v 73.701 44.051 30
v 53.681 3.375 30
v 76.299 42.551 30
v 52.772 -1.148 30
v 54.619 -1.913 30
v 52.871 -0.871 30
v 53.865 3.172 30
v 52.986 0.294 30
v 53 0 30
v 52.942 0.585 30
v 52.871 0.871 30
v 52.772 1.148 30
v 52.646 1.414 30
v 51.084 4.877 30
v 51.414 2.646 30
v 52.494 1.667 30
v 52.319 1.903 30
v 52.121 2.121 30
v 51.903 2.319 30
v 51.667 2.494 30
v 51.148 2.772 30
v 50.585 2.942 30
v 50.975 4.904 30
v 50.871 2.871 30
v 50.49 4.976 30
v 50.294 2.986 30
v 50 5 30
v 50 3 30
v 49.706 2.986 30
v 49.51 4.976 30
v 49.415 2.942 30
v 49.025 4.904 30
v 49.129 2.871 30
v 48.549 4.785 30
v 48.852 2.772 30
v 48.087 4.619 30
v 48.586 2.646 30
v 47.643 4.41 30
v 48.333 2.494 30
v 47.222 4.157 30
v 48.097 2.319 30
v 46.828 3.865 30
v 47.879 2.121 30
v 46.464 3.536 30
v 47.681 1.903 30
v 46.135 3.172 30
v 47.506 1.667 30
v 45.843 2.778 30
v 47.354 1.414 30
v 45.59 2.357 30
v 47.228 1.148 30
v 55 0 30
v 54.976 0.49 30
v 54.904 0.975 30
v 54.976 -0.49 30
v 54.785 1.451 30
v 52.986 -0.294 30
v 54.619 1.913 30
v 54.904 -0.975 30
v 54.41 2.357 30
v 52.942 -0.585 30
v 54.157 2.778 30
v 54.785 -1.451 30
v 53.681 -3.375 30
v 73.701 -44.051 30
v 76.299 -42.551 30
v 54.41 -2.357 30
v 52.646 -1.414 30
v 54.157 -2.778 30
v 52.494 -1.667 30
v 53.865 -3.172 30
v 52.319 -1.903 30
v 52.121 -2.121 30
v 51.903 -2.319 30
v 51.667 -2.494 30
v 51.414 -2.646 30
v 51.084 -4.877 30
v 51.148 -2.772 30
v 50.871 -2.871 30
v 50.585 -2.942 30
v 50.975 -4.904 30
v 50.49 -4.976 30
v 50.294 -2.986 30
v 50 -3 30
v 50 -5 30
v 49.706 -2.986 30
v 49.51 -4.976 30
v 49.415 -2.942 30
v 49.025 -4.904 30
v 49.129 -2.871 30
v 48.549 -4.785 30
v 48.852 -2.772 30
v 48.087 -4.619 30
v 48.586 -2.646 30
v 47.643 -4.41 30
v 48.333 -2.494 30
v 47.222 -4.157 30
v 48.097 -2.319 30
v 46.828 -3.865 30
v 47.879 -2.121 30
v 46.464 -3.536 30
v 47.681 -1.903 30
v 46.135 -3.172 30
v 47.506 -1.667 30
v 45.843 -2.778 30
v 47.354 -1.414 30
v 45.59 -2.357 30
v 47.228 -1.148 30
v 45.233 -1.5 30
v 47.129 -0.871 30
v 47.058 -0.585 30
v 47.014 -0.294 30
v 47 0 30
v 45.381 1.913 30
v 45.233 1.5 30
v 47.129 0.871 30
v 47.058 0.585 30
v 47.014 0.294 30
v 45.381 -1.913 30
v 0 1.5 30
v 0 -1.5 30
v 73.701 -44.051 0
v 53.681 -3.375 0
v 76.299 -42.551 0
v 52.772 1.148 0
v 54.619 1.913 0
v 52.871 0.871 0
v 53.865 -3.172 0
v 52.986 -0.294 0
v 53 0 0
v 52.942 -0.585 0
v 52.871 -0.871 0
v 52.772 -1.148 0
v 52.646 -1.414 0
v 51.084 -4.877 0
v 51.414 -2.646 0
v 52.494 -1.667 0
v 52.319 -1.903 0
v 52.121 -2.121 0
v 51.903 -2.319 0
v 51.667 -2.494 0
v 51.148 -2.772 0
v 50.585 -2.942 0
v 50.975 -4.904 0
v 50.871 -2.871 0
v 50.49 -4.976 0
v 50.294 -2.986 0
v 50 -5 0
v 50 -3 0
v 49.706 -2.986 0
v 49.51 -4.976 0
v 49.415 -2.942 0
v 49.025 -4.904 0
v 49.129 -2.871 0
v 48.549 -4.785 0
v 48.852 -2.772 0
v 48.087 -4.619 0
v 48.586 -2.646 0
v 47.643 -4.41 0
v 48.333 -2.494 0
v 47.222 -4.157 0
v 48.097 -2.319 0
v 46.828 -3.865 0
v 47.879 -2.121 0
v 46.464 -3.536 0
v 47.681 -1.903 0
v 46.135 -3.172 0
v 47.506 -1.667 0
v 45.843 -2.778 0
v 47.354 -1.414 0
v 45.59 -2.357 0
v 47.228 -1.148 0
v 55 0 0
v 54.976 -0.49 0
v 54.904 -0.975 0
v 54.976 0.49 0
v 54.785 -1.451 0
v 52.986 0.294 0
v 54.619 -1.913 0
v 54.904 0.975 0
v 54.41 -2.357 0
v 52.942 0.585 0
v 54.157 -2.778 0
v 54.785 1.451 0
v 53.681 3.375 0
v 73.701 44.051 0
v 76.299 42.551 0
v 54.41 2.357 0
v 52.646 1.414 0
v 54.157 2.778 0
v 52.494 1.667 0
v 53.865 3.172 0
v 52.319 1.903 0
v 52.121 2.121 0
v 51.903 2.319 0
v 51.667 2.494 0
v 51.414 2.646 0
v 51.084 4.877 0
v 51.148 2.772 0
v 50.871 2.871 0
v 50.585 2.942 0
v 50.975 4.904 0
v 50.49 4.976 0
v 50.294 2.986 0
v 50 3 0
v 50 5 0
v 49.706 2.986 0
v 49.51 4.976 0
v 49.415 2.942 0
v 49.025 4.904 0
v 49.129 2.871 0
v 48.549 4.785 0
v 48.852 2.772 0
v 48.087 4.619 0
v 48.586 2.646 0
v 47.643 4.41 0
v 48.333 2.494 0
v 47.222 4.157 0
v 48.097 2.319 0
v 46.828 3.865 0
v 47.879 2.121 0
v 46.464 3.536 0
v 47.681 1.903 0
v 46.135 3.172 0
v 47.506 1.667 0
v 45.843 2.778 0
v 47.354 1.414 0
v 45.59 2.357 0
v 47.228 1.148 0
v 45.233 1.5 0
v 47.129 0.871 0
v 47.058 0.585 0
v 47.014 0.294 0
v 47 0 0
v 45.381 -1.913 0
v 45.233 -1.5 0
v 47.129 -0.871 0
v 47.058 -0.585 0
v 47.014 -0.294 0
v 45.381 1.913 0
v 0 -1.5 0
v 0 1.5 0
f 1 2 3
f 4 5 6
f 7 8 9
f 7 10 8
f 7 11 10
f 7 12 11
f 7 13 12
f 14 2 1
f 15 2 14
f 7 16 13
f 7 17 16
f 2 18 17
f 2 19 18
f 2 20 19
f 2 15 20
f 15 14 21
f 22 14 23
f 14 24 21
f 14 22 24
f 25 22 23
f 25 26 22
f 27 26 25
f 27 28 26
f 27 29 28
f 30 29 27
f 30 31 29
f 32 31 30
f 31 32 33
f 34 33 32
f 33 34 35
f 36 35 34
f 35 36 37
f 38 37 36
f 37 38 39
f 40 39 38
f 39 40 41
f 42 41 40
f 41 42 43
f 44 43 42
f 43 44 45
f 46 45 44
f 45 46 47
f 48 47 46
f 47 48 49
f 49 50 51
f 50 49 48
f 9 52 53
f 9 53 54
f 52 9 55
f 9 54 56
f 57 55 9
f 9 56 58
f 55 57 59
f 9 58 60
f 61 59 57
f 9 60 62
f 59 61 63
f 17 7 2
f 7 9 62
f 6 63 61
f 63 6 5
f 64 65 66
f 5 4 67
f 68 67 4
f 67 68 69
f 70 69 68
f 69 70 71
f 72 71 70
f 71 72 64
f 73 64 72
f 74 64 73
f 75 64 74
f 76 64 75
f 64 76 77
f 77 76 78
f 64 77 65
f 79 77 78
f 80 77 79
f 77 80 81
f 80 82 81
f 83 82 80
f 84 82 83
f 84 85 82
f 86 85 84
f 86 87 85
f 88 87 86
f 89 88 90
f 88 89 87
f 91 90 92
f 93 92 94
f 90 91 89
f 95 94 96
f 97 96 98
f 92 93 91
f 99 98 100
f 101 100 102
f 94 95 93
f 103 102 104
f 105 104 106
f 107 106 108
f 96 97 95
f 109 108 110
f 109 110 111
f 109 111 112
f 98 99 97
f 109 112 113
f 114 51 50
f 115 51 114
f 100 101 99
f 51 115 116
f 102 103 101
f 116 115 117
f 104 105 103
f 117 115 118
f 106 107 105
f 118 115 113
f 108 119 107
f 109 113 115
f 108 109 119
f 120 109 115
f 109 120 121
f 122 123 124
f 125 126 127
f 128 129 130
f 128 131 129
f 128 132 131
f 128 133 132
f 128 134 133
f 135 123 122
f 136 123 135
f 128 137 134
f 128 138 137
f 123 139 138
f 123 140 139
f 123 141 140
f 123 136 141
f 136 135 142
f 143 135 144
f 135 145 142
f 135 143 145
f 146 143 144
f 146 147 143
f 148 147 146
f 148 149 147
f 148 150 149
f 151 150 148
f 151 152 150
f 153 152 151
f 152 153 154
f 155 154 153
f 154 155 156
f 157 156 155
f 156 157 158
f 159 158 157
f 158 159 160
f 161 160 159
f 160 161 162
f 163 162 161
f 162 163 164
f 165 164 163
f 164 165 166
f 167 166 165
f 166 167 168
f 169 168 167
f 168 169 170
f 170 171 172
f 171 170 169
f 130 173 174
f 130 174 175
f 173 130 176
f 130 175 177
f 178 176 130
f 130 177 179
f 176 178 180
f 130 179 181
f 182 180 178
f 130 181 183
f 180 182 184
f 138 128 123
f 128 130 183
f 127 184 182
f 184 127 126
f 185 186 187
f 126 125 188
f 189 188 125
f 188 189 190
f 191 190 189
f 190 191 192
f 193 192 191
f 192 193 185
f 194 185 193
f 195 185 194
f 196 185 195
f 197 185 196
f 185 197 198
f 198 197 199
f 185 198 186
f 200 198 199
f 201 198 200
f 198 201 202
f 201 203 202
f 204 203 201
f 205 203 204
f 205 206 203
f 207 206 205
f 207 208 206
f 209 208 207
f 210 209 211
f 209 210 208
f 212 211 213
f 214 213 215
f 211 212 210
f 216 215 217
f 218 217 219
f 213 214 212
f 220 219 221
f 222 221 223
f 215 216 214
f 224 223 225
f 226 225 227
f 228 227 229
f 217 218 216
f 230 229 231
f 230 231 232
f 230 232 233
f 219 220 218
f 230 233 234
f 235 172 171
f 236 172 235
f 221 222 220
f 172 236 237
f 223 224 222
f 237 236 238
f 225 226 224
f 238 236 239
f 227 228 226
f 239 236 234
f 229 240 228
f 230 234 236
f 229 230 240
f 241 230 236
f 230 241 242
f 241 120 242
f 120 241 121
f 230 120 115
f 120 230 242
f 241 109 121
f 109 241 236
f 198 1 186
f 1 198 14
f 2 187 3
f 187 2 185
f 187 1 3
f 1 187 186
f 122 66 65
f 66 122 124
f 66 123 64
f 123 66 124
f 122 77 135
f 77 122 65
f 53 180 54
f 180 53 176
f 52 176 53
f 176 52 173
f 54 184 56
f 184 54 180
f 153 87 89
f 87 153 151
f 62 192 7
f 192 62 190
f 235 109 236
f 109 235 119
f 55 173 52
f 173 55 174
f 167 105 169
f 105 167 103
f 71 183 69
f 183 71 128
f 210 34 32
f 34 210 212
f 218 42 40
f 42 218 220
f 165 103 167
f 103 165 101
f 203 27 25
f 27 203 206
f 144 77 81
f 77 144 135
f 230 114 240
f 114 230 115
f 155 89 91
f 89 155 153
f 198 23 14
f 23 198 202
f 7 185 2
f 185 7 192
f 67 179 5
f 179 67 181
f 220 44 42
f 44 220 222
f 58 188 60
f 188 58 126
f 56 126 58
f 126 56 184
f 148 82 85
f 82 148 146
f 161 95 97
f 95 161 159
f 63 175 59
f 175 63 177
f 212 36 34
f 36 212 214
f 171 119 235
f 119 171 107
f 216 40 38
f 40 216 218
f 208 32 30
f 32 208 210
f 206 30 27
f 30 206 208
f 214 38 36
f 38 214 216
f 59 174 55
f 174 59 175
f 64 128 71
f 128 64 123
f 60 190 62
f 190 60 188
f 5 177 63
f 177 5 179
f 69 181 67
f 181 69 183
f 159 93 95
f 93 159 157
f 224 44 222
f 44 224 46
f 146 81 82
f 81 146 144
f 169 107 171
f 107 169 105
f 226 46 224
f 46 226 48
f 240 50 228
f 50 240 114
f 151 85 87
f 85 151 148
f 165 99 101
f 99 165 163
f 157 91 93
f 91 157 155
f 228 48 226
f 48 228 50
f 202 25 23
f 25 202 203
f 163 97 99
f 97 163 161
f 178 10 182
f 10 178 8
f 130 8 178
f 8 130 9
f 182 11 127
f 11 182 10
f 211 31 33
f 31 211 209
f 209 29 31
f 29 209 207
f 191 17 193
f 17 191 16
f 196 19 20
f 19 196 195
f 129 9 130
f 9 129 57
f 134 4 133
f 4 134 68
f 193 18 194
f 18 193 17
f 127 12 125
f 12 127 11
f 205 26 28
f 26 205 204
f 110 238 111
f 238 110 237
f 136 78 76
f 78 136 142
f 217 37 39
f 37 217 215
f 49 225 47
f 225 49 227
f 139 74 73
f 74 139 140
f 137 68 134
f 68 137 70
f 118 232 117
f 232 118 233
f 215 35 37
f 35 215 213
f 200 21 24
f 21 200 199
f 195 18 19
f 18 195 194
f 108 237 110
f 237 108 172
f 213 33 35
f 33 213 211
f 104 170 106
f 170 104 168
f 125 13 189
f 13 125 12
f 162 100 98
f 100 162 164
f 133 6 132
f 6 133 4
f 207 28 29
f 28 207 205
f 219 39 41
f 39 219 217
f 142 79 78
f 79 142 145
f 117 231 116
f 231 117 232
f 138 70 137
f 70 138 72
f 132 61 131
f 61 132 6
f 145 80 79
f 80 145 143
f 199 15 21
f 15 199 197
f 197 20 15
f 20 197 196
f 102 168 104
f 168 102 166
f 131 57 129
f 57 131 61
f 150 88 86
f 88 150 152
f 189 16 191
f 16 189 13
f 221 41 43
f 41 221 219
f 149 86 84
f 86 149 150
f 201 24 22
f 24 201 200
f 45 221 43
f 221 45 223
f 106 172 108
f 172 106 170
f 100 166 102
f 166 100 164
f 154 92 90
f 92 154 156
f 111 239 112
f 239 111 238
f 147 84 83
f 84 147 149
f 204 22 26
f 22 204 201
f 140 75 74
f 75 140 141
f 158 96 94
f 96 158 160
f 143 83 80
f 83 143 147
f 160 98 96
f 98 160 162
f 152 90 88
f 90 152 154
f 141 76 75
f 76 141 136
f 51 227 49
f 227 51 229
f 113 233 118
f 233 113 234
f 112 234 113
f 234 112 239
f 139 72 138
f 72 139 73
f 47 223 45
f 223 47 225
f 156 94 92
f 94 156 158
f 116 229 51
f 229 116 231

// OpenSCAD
// test
$fn=64;

$z_max=30;
$arm_max=50;
$arm_wide=3;

$center_r=5;
$center_hole=3;

module make_flat() {
    translate([0,-($arm_wide/2),0]) {
        cube([$arm_max,$arm_wide,$z_max]);
    }
}

module make_tripod() {
   union () {
        make_flat();
        translate([$arm_max,0,0]) {
            rotate([0,0,60]) {
                make_flat();
            }
        }
        translate([$arm_max,0,0]) {
            rotate([0,0,-60]) {
                make_flat();
            }
        }
        translate([$arm_max, 0, 0]) {
            cylinder(r=$center_r, h=$z_max);
        }
    }  
}

module unit() {
    difference () {
        make_tripod();
        translate([$arm_max, 0, -1]) {
            cylinder(r=$center_hole, h=$z_max+2);
        }
    }
}

unit();
